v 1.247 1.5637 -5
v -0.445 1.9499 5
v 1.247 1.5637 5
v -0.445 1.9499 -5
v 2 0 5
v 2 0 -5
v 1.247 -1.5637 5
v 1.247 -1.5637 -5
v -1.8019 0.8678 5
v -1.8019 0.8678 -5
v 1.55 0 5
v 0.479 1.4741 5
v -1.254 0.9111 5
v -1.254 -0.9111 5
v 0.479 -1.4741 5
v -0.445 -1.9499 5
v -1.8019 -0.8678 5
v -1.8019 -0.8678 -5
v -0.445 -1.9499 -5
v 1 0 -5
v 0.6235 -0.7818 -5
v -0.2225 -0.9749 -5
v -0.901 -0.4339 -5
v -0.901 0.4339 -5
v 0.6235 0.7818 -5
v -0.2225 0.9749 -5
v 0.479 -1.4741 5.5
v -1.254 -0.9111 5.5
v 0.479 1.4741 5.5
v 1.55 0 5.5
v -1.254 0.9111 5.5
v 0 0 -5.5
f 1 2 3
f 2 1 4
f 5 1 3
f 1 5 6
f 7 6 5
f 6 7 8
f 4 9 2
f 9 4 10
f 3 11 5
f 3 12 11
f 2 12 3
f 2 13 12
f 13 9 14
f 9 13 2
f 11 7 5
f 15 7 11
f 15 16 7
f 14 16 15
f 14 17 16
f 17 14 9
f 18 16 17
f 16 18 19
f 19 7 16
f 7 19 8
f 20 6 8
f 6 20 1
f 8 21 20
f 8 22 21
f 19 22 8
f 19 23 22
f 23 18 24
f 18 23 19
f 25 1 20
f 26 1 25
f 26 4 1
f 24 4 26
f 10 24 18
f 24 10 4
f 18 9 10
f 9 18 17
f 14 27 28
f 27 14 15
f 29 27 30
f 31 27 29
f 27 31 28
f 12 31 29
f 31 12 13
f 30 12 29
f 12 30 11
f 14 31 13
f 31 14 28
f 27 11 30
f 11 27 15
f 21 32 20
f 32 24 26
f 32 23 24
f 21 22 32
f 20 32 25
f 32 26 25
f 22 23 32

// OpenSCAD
// Parameters
length_mm = 10; //[5:20:1]
major_diameter_mm = 4; //[2:8:0.1]
minor_diameter_mm = 3.1; //[1.55:6.2:0.1]
thread_pitch_mm = 0.7; //[0.35:1.4:0.05]
socket_af_mm = 2; //[1:4:0.1]
socket_depth_mm = 2; //[1:4:0.1]
tolerance_mm = 0.1; //[0.05:0.3:0.01]
overlap_mm = 1; //[0.5:2:0.1]
thread_runout_len_mm = 1; //[0.5:2:0.1]
tip_chamfer_len_mm = 1; //[0.5:2:0.1]
major_radius_mm = 2; //[1:4:0.1]
minor_radius_mm = 1.55; //[0.775:3.1:0.1]
socket_radius_mm = 1.1547; //[0.577:2.3094:0.01]

// Screw - complete geometry
module screw() {
  color("DimGray") {
    // Grub screw body
    cylinder(r=major_diameter_mm/2, h=length_mm, center=true);

    // Threaded shaft
    translate([0, 0, -thread_runout_len_mm/2])
      cylinder(r=major_diameter_mm/2, h=length_mm - thread_runout_len_mm, center=true);

    // Thread runout
    translate([0, 0, length_mm/2 - thread_runout_len_mm/2])
      cylinder(r=minor_diameter_mm/2, h=thread_runout_len_mm + overlap_mm, center=true);

    // Chamfer or point tip
    translate([0, 0, -length_mm/2 + tip_chamfer_len_mm/2 - overlap_mm/2])
      rotate([180, 0, 0])
      cylinder(r1=major_diameter_mm/2, r2=0, h=tip_chamfer_len_mm, center=true);

    // Hex socket drive
    translate([0, 0, length_mm/2 - socket_depth_mm/2])
      difference() {
        cylinder(r=socket_radius_mm, h=socket_depth_mm + overlap_mm, center=true);
        rotate([0, 0, 0])
          cylinder(r=socket_radius_mm, h=socket_depth_mm + overlap_mm, center=true);
      }
  }
}

// Assembly
module assembly() {
  screw();
}

assembly();
